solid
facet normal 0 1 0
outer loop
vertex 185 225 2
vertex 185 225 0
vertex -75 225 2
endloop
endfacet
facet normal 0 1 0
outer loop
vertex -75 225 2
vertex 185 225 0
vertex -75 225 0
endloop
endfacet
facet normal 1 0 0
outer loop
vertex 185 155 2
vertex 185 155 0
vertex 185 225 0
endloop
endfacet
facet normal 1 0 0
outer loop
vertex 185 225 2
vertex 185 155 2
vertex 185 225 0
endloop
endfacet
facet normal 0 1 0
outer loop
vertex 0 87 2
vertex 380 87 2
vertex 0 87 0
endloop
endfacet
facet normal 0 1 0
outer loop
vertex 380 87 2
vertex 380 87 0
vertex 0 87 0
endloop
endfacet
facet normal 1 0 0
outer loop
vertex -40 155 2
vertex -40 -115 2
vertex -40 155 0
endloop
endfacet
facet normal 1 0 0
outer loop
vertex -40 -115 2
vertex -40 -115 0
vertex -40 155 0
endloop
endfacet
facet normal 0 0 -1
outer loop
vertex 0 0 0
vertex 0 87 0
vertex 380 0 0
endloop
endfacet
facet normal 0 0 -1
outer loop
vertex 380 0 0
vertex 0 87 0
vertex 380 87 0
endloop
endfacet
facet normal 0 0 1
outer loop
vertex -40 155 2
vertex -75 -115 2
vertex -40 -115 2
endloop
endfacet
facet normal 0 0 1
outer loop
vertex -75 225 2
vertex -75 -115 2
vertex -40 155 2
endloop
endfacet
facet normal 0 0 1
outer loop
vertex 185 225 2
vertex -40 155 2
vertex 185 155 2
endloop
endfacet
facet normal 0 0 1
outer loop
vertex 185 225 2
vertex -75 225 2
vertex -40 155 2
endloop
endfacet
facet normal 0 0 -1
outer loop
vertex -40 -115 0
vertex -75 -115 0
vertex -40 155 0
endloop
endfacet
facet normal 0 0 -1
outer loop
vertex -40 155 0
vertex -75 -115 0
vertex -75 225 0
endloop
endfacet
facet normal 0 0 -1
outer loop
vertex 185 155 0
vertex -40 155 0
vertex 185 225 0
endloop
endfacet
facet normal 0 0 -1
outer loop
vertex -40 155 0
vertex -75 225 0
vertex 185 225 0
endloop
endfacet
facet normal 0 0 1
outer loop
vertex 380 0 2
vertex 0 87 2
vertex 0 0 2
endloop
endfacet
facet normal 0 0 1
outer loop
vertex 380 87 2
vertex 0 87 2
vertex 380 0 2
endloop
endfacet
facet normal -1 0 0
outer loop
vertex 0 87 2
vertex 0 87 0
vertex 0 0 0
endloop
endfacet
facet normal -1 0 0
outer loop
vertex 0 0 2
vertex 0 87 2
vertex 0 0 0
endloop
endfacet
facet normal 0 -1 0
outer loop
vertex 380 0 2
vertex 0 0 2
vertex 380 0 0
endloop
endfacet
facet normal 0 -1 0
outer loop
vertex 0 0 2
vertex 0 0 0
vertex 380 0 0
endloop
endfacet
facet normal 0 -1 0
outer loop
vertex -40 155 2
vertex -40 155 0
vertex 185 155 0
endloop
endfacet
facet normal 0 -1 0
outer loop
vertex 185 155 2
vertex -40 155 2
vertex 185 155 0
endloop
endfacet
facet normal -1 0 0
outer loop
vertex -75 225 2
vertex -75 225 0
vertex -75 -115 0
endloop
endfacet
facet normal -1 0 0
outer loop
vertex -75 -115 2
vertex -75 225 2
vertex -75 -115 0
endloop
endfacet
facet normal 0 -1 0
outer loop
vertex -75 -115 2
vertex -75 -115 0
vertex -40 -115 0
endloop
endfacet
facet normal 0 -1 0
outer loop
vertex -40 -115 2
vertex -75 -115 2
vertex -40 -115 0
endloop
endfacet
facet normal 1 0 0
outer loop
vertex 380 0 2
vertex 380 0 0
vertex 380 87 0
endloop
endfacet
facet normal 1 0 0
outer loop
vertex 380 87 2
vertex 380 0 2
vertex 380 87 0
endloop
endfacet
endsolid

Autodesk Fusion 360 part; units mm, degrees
sketch "Sketch1" plane through (0, 0, 0) normal (0, 0, 1) x (1, 0, 0) in component "Bin lid"
  line L0 (0, 0) -> (380, 0)
  line L1 (380, 0) -> (380, 87)
  line L2 (380, 87) -> (0, 87)
  line L3 (0, 87) -> (0, 0)
  dimension "d1" = 380
  dimension "d2" = 87
extrude "Extrude1" add sketch "Sketch1" along normal blind 2 makes body 1 in component "Bin lid"
sketch "Sketch1 (2)" plane through (0, 0, 0) normal (0, 0, 1) x (1, 0, 0) in component "Bin guide"
  line L0 (-75, 225) -> (-75, -115)
  line L1 (185, 225) -> (-75, 225)
  line L2 (185, 155) -> (185, 225)
  line L3 (-40, -115) -> (-40, 155)
  line L4 (-40, 155) -> (185, 155)
  line L5 (-75, -115) -> (-40, -115)
extrude "Extrude1'" add sketch "Sketch1 (2)" along normal blind 2 separate body makes body 2 in component "Bin guide"
component "Bin lid" placed x (1, 0, 0) y (0, 1, 0) z (0, 0, 1) at (0, 0, 0)
component "Bin guide" placed x (1, 0, 0) y (0, 1, 0) z (0, 0, 1) at (0, 0, 0)
